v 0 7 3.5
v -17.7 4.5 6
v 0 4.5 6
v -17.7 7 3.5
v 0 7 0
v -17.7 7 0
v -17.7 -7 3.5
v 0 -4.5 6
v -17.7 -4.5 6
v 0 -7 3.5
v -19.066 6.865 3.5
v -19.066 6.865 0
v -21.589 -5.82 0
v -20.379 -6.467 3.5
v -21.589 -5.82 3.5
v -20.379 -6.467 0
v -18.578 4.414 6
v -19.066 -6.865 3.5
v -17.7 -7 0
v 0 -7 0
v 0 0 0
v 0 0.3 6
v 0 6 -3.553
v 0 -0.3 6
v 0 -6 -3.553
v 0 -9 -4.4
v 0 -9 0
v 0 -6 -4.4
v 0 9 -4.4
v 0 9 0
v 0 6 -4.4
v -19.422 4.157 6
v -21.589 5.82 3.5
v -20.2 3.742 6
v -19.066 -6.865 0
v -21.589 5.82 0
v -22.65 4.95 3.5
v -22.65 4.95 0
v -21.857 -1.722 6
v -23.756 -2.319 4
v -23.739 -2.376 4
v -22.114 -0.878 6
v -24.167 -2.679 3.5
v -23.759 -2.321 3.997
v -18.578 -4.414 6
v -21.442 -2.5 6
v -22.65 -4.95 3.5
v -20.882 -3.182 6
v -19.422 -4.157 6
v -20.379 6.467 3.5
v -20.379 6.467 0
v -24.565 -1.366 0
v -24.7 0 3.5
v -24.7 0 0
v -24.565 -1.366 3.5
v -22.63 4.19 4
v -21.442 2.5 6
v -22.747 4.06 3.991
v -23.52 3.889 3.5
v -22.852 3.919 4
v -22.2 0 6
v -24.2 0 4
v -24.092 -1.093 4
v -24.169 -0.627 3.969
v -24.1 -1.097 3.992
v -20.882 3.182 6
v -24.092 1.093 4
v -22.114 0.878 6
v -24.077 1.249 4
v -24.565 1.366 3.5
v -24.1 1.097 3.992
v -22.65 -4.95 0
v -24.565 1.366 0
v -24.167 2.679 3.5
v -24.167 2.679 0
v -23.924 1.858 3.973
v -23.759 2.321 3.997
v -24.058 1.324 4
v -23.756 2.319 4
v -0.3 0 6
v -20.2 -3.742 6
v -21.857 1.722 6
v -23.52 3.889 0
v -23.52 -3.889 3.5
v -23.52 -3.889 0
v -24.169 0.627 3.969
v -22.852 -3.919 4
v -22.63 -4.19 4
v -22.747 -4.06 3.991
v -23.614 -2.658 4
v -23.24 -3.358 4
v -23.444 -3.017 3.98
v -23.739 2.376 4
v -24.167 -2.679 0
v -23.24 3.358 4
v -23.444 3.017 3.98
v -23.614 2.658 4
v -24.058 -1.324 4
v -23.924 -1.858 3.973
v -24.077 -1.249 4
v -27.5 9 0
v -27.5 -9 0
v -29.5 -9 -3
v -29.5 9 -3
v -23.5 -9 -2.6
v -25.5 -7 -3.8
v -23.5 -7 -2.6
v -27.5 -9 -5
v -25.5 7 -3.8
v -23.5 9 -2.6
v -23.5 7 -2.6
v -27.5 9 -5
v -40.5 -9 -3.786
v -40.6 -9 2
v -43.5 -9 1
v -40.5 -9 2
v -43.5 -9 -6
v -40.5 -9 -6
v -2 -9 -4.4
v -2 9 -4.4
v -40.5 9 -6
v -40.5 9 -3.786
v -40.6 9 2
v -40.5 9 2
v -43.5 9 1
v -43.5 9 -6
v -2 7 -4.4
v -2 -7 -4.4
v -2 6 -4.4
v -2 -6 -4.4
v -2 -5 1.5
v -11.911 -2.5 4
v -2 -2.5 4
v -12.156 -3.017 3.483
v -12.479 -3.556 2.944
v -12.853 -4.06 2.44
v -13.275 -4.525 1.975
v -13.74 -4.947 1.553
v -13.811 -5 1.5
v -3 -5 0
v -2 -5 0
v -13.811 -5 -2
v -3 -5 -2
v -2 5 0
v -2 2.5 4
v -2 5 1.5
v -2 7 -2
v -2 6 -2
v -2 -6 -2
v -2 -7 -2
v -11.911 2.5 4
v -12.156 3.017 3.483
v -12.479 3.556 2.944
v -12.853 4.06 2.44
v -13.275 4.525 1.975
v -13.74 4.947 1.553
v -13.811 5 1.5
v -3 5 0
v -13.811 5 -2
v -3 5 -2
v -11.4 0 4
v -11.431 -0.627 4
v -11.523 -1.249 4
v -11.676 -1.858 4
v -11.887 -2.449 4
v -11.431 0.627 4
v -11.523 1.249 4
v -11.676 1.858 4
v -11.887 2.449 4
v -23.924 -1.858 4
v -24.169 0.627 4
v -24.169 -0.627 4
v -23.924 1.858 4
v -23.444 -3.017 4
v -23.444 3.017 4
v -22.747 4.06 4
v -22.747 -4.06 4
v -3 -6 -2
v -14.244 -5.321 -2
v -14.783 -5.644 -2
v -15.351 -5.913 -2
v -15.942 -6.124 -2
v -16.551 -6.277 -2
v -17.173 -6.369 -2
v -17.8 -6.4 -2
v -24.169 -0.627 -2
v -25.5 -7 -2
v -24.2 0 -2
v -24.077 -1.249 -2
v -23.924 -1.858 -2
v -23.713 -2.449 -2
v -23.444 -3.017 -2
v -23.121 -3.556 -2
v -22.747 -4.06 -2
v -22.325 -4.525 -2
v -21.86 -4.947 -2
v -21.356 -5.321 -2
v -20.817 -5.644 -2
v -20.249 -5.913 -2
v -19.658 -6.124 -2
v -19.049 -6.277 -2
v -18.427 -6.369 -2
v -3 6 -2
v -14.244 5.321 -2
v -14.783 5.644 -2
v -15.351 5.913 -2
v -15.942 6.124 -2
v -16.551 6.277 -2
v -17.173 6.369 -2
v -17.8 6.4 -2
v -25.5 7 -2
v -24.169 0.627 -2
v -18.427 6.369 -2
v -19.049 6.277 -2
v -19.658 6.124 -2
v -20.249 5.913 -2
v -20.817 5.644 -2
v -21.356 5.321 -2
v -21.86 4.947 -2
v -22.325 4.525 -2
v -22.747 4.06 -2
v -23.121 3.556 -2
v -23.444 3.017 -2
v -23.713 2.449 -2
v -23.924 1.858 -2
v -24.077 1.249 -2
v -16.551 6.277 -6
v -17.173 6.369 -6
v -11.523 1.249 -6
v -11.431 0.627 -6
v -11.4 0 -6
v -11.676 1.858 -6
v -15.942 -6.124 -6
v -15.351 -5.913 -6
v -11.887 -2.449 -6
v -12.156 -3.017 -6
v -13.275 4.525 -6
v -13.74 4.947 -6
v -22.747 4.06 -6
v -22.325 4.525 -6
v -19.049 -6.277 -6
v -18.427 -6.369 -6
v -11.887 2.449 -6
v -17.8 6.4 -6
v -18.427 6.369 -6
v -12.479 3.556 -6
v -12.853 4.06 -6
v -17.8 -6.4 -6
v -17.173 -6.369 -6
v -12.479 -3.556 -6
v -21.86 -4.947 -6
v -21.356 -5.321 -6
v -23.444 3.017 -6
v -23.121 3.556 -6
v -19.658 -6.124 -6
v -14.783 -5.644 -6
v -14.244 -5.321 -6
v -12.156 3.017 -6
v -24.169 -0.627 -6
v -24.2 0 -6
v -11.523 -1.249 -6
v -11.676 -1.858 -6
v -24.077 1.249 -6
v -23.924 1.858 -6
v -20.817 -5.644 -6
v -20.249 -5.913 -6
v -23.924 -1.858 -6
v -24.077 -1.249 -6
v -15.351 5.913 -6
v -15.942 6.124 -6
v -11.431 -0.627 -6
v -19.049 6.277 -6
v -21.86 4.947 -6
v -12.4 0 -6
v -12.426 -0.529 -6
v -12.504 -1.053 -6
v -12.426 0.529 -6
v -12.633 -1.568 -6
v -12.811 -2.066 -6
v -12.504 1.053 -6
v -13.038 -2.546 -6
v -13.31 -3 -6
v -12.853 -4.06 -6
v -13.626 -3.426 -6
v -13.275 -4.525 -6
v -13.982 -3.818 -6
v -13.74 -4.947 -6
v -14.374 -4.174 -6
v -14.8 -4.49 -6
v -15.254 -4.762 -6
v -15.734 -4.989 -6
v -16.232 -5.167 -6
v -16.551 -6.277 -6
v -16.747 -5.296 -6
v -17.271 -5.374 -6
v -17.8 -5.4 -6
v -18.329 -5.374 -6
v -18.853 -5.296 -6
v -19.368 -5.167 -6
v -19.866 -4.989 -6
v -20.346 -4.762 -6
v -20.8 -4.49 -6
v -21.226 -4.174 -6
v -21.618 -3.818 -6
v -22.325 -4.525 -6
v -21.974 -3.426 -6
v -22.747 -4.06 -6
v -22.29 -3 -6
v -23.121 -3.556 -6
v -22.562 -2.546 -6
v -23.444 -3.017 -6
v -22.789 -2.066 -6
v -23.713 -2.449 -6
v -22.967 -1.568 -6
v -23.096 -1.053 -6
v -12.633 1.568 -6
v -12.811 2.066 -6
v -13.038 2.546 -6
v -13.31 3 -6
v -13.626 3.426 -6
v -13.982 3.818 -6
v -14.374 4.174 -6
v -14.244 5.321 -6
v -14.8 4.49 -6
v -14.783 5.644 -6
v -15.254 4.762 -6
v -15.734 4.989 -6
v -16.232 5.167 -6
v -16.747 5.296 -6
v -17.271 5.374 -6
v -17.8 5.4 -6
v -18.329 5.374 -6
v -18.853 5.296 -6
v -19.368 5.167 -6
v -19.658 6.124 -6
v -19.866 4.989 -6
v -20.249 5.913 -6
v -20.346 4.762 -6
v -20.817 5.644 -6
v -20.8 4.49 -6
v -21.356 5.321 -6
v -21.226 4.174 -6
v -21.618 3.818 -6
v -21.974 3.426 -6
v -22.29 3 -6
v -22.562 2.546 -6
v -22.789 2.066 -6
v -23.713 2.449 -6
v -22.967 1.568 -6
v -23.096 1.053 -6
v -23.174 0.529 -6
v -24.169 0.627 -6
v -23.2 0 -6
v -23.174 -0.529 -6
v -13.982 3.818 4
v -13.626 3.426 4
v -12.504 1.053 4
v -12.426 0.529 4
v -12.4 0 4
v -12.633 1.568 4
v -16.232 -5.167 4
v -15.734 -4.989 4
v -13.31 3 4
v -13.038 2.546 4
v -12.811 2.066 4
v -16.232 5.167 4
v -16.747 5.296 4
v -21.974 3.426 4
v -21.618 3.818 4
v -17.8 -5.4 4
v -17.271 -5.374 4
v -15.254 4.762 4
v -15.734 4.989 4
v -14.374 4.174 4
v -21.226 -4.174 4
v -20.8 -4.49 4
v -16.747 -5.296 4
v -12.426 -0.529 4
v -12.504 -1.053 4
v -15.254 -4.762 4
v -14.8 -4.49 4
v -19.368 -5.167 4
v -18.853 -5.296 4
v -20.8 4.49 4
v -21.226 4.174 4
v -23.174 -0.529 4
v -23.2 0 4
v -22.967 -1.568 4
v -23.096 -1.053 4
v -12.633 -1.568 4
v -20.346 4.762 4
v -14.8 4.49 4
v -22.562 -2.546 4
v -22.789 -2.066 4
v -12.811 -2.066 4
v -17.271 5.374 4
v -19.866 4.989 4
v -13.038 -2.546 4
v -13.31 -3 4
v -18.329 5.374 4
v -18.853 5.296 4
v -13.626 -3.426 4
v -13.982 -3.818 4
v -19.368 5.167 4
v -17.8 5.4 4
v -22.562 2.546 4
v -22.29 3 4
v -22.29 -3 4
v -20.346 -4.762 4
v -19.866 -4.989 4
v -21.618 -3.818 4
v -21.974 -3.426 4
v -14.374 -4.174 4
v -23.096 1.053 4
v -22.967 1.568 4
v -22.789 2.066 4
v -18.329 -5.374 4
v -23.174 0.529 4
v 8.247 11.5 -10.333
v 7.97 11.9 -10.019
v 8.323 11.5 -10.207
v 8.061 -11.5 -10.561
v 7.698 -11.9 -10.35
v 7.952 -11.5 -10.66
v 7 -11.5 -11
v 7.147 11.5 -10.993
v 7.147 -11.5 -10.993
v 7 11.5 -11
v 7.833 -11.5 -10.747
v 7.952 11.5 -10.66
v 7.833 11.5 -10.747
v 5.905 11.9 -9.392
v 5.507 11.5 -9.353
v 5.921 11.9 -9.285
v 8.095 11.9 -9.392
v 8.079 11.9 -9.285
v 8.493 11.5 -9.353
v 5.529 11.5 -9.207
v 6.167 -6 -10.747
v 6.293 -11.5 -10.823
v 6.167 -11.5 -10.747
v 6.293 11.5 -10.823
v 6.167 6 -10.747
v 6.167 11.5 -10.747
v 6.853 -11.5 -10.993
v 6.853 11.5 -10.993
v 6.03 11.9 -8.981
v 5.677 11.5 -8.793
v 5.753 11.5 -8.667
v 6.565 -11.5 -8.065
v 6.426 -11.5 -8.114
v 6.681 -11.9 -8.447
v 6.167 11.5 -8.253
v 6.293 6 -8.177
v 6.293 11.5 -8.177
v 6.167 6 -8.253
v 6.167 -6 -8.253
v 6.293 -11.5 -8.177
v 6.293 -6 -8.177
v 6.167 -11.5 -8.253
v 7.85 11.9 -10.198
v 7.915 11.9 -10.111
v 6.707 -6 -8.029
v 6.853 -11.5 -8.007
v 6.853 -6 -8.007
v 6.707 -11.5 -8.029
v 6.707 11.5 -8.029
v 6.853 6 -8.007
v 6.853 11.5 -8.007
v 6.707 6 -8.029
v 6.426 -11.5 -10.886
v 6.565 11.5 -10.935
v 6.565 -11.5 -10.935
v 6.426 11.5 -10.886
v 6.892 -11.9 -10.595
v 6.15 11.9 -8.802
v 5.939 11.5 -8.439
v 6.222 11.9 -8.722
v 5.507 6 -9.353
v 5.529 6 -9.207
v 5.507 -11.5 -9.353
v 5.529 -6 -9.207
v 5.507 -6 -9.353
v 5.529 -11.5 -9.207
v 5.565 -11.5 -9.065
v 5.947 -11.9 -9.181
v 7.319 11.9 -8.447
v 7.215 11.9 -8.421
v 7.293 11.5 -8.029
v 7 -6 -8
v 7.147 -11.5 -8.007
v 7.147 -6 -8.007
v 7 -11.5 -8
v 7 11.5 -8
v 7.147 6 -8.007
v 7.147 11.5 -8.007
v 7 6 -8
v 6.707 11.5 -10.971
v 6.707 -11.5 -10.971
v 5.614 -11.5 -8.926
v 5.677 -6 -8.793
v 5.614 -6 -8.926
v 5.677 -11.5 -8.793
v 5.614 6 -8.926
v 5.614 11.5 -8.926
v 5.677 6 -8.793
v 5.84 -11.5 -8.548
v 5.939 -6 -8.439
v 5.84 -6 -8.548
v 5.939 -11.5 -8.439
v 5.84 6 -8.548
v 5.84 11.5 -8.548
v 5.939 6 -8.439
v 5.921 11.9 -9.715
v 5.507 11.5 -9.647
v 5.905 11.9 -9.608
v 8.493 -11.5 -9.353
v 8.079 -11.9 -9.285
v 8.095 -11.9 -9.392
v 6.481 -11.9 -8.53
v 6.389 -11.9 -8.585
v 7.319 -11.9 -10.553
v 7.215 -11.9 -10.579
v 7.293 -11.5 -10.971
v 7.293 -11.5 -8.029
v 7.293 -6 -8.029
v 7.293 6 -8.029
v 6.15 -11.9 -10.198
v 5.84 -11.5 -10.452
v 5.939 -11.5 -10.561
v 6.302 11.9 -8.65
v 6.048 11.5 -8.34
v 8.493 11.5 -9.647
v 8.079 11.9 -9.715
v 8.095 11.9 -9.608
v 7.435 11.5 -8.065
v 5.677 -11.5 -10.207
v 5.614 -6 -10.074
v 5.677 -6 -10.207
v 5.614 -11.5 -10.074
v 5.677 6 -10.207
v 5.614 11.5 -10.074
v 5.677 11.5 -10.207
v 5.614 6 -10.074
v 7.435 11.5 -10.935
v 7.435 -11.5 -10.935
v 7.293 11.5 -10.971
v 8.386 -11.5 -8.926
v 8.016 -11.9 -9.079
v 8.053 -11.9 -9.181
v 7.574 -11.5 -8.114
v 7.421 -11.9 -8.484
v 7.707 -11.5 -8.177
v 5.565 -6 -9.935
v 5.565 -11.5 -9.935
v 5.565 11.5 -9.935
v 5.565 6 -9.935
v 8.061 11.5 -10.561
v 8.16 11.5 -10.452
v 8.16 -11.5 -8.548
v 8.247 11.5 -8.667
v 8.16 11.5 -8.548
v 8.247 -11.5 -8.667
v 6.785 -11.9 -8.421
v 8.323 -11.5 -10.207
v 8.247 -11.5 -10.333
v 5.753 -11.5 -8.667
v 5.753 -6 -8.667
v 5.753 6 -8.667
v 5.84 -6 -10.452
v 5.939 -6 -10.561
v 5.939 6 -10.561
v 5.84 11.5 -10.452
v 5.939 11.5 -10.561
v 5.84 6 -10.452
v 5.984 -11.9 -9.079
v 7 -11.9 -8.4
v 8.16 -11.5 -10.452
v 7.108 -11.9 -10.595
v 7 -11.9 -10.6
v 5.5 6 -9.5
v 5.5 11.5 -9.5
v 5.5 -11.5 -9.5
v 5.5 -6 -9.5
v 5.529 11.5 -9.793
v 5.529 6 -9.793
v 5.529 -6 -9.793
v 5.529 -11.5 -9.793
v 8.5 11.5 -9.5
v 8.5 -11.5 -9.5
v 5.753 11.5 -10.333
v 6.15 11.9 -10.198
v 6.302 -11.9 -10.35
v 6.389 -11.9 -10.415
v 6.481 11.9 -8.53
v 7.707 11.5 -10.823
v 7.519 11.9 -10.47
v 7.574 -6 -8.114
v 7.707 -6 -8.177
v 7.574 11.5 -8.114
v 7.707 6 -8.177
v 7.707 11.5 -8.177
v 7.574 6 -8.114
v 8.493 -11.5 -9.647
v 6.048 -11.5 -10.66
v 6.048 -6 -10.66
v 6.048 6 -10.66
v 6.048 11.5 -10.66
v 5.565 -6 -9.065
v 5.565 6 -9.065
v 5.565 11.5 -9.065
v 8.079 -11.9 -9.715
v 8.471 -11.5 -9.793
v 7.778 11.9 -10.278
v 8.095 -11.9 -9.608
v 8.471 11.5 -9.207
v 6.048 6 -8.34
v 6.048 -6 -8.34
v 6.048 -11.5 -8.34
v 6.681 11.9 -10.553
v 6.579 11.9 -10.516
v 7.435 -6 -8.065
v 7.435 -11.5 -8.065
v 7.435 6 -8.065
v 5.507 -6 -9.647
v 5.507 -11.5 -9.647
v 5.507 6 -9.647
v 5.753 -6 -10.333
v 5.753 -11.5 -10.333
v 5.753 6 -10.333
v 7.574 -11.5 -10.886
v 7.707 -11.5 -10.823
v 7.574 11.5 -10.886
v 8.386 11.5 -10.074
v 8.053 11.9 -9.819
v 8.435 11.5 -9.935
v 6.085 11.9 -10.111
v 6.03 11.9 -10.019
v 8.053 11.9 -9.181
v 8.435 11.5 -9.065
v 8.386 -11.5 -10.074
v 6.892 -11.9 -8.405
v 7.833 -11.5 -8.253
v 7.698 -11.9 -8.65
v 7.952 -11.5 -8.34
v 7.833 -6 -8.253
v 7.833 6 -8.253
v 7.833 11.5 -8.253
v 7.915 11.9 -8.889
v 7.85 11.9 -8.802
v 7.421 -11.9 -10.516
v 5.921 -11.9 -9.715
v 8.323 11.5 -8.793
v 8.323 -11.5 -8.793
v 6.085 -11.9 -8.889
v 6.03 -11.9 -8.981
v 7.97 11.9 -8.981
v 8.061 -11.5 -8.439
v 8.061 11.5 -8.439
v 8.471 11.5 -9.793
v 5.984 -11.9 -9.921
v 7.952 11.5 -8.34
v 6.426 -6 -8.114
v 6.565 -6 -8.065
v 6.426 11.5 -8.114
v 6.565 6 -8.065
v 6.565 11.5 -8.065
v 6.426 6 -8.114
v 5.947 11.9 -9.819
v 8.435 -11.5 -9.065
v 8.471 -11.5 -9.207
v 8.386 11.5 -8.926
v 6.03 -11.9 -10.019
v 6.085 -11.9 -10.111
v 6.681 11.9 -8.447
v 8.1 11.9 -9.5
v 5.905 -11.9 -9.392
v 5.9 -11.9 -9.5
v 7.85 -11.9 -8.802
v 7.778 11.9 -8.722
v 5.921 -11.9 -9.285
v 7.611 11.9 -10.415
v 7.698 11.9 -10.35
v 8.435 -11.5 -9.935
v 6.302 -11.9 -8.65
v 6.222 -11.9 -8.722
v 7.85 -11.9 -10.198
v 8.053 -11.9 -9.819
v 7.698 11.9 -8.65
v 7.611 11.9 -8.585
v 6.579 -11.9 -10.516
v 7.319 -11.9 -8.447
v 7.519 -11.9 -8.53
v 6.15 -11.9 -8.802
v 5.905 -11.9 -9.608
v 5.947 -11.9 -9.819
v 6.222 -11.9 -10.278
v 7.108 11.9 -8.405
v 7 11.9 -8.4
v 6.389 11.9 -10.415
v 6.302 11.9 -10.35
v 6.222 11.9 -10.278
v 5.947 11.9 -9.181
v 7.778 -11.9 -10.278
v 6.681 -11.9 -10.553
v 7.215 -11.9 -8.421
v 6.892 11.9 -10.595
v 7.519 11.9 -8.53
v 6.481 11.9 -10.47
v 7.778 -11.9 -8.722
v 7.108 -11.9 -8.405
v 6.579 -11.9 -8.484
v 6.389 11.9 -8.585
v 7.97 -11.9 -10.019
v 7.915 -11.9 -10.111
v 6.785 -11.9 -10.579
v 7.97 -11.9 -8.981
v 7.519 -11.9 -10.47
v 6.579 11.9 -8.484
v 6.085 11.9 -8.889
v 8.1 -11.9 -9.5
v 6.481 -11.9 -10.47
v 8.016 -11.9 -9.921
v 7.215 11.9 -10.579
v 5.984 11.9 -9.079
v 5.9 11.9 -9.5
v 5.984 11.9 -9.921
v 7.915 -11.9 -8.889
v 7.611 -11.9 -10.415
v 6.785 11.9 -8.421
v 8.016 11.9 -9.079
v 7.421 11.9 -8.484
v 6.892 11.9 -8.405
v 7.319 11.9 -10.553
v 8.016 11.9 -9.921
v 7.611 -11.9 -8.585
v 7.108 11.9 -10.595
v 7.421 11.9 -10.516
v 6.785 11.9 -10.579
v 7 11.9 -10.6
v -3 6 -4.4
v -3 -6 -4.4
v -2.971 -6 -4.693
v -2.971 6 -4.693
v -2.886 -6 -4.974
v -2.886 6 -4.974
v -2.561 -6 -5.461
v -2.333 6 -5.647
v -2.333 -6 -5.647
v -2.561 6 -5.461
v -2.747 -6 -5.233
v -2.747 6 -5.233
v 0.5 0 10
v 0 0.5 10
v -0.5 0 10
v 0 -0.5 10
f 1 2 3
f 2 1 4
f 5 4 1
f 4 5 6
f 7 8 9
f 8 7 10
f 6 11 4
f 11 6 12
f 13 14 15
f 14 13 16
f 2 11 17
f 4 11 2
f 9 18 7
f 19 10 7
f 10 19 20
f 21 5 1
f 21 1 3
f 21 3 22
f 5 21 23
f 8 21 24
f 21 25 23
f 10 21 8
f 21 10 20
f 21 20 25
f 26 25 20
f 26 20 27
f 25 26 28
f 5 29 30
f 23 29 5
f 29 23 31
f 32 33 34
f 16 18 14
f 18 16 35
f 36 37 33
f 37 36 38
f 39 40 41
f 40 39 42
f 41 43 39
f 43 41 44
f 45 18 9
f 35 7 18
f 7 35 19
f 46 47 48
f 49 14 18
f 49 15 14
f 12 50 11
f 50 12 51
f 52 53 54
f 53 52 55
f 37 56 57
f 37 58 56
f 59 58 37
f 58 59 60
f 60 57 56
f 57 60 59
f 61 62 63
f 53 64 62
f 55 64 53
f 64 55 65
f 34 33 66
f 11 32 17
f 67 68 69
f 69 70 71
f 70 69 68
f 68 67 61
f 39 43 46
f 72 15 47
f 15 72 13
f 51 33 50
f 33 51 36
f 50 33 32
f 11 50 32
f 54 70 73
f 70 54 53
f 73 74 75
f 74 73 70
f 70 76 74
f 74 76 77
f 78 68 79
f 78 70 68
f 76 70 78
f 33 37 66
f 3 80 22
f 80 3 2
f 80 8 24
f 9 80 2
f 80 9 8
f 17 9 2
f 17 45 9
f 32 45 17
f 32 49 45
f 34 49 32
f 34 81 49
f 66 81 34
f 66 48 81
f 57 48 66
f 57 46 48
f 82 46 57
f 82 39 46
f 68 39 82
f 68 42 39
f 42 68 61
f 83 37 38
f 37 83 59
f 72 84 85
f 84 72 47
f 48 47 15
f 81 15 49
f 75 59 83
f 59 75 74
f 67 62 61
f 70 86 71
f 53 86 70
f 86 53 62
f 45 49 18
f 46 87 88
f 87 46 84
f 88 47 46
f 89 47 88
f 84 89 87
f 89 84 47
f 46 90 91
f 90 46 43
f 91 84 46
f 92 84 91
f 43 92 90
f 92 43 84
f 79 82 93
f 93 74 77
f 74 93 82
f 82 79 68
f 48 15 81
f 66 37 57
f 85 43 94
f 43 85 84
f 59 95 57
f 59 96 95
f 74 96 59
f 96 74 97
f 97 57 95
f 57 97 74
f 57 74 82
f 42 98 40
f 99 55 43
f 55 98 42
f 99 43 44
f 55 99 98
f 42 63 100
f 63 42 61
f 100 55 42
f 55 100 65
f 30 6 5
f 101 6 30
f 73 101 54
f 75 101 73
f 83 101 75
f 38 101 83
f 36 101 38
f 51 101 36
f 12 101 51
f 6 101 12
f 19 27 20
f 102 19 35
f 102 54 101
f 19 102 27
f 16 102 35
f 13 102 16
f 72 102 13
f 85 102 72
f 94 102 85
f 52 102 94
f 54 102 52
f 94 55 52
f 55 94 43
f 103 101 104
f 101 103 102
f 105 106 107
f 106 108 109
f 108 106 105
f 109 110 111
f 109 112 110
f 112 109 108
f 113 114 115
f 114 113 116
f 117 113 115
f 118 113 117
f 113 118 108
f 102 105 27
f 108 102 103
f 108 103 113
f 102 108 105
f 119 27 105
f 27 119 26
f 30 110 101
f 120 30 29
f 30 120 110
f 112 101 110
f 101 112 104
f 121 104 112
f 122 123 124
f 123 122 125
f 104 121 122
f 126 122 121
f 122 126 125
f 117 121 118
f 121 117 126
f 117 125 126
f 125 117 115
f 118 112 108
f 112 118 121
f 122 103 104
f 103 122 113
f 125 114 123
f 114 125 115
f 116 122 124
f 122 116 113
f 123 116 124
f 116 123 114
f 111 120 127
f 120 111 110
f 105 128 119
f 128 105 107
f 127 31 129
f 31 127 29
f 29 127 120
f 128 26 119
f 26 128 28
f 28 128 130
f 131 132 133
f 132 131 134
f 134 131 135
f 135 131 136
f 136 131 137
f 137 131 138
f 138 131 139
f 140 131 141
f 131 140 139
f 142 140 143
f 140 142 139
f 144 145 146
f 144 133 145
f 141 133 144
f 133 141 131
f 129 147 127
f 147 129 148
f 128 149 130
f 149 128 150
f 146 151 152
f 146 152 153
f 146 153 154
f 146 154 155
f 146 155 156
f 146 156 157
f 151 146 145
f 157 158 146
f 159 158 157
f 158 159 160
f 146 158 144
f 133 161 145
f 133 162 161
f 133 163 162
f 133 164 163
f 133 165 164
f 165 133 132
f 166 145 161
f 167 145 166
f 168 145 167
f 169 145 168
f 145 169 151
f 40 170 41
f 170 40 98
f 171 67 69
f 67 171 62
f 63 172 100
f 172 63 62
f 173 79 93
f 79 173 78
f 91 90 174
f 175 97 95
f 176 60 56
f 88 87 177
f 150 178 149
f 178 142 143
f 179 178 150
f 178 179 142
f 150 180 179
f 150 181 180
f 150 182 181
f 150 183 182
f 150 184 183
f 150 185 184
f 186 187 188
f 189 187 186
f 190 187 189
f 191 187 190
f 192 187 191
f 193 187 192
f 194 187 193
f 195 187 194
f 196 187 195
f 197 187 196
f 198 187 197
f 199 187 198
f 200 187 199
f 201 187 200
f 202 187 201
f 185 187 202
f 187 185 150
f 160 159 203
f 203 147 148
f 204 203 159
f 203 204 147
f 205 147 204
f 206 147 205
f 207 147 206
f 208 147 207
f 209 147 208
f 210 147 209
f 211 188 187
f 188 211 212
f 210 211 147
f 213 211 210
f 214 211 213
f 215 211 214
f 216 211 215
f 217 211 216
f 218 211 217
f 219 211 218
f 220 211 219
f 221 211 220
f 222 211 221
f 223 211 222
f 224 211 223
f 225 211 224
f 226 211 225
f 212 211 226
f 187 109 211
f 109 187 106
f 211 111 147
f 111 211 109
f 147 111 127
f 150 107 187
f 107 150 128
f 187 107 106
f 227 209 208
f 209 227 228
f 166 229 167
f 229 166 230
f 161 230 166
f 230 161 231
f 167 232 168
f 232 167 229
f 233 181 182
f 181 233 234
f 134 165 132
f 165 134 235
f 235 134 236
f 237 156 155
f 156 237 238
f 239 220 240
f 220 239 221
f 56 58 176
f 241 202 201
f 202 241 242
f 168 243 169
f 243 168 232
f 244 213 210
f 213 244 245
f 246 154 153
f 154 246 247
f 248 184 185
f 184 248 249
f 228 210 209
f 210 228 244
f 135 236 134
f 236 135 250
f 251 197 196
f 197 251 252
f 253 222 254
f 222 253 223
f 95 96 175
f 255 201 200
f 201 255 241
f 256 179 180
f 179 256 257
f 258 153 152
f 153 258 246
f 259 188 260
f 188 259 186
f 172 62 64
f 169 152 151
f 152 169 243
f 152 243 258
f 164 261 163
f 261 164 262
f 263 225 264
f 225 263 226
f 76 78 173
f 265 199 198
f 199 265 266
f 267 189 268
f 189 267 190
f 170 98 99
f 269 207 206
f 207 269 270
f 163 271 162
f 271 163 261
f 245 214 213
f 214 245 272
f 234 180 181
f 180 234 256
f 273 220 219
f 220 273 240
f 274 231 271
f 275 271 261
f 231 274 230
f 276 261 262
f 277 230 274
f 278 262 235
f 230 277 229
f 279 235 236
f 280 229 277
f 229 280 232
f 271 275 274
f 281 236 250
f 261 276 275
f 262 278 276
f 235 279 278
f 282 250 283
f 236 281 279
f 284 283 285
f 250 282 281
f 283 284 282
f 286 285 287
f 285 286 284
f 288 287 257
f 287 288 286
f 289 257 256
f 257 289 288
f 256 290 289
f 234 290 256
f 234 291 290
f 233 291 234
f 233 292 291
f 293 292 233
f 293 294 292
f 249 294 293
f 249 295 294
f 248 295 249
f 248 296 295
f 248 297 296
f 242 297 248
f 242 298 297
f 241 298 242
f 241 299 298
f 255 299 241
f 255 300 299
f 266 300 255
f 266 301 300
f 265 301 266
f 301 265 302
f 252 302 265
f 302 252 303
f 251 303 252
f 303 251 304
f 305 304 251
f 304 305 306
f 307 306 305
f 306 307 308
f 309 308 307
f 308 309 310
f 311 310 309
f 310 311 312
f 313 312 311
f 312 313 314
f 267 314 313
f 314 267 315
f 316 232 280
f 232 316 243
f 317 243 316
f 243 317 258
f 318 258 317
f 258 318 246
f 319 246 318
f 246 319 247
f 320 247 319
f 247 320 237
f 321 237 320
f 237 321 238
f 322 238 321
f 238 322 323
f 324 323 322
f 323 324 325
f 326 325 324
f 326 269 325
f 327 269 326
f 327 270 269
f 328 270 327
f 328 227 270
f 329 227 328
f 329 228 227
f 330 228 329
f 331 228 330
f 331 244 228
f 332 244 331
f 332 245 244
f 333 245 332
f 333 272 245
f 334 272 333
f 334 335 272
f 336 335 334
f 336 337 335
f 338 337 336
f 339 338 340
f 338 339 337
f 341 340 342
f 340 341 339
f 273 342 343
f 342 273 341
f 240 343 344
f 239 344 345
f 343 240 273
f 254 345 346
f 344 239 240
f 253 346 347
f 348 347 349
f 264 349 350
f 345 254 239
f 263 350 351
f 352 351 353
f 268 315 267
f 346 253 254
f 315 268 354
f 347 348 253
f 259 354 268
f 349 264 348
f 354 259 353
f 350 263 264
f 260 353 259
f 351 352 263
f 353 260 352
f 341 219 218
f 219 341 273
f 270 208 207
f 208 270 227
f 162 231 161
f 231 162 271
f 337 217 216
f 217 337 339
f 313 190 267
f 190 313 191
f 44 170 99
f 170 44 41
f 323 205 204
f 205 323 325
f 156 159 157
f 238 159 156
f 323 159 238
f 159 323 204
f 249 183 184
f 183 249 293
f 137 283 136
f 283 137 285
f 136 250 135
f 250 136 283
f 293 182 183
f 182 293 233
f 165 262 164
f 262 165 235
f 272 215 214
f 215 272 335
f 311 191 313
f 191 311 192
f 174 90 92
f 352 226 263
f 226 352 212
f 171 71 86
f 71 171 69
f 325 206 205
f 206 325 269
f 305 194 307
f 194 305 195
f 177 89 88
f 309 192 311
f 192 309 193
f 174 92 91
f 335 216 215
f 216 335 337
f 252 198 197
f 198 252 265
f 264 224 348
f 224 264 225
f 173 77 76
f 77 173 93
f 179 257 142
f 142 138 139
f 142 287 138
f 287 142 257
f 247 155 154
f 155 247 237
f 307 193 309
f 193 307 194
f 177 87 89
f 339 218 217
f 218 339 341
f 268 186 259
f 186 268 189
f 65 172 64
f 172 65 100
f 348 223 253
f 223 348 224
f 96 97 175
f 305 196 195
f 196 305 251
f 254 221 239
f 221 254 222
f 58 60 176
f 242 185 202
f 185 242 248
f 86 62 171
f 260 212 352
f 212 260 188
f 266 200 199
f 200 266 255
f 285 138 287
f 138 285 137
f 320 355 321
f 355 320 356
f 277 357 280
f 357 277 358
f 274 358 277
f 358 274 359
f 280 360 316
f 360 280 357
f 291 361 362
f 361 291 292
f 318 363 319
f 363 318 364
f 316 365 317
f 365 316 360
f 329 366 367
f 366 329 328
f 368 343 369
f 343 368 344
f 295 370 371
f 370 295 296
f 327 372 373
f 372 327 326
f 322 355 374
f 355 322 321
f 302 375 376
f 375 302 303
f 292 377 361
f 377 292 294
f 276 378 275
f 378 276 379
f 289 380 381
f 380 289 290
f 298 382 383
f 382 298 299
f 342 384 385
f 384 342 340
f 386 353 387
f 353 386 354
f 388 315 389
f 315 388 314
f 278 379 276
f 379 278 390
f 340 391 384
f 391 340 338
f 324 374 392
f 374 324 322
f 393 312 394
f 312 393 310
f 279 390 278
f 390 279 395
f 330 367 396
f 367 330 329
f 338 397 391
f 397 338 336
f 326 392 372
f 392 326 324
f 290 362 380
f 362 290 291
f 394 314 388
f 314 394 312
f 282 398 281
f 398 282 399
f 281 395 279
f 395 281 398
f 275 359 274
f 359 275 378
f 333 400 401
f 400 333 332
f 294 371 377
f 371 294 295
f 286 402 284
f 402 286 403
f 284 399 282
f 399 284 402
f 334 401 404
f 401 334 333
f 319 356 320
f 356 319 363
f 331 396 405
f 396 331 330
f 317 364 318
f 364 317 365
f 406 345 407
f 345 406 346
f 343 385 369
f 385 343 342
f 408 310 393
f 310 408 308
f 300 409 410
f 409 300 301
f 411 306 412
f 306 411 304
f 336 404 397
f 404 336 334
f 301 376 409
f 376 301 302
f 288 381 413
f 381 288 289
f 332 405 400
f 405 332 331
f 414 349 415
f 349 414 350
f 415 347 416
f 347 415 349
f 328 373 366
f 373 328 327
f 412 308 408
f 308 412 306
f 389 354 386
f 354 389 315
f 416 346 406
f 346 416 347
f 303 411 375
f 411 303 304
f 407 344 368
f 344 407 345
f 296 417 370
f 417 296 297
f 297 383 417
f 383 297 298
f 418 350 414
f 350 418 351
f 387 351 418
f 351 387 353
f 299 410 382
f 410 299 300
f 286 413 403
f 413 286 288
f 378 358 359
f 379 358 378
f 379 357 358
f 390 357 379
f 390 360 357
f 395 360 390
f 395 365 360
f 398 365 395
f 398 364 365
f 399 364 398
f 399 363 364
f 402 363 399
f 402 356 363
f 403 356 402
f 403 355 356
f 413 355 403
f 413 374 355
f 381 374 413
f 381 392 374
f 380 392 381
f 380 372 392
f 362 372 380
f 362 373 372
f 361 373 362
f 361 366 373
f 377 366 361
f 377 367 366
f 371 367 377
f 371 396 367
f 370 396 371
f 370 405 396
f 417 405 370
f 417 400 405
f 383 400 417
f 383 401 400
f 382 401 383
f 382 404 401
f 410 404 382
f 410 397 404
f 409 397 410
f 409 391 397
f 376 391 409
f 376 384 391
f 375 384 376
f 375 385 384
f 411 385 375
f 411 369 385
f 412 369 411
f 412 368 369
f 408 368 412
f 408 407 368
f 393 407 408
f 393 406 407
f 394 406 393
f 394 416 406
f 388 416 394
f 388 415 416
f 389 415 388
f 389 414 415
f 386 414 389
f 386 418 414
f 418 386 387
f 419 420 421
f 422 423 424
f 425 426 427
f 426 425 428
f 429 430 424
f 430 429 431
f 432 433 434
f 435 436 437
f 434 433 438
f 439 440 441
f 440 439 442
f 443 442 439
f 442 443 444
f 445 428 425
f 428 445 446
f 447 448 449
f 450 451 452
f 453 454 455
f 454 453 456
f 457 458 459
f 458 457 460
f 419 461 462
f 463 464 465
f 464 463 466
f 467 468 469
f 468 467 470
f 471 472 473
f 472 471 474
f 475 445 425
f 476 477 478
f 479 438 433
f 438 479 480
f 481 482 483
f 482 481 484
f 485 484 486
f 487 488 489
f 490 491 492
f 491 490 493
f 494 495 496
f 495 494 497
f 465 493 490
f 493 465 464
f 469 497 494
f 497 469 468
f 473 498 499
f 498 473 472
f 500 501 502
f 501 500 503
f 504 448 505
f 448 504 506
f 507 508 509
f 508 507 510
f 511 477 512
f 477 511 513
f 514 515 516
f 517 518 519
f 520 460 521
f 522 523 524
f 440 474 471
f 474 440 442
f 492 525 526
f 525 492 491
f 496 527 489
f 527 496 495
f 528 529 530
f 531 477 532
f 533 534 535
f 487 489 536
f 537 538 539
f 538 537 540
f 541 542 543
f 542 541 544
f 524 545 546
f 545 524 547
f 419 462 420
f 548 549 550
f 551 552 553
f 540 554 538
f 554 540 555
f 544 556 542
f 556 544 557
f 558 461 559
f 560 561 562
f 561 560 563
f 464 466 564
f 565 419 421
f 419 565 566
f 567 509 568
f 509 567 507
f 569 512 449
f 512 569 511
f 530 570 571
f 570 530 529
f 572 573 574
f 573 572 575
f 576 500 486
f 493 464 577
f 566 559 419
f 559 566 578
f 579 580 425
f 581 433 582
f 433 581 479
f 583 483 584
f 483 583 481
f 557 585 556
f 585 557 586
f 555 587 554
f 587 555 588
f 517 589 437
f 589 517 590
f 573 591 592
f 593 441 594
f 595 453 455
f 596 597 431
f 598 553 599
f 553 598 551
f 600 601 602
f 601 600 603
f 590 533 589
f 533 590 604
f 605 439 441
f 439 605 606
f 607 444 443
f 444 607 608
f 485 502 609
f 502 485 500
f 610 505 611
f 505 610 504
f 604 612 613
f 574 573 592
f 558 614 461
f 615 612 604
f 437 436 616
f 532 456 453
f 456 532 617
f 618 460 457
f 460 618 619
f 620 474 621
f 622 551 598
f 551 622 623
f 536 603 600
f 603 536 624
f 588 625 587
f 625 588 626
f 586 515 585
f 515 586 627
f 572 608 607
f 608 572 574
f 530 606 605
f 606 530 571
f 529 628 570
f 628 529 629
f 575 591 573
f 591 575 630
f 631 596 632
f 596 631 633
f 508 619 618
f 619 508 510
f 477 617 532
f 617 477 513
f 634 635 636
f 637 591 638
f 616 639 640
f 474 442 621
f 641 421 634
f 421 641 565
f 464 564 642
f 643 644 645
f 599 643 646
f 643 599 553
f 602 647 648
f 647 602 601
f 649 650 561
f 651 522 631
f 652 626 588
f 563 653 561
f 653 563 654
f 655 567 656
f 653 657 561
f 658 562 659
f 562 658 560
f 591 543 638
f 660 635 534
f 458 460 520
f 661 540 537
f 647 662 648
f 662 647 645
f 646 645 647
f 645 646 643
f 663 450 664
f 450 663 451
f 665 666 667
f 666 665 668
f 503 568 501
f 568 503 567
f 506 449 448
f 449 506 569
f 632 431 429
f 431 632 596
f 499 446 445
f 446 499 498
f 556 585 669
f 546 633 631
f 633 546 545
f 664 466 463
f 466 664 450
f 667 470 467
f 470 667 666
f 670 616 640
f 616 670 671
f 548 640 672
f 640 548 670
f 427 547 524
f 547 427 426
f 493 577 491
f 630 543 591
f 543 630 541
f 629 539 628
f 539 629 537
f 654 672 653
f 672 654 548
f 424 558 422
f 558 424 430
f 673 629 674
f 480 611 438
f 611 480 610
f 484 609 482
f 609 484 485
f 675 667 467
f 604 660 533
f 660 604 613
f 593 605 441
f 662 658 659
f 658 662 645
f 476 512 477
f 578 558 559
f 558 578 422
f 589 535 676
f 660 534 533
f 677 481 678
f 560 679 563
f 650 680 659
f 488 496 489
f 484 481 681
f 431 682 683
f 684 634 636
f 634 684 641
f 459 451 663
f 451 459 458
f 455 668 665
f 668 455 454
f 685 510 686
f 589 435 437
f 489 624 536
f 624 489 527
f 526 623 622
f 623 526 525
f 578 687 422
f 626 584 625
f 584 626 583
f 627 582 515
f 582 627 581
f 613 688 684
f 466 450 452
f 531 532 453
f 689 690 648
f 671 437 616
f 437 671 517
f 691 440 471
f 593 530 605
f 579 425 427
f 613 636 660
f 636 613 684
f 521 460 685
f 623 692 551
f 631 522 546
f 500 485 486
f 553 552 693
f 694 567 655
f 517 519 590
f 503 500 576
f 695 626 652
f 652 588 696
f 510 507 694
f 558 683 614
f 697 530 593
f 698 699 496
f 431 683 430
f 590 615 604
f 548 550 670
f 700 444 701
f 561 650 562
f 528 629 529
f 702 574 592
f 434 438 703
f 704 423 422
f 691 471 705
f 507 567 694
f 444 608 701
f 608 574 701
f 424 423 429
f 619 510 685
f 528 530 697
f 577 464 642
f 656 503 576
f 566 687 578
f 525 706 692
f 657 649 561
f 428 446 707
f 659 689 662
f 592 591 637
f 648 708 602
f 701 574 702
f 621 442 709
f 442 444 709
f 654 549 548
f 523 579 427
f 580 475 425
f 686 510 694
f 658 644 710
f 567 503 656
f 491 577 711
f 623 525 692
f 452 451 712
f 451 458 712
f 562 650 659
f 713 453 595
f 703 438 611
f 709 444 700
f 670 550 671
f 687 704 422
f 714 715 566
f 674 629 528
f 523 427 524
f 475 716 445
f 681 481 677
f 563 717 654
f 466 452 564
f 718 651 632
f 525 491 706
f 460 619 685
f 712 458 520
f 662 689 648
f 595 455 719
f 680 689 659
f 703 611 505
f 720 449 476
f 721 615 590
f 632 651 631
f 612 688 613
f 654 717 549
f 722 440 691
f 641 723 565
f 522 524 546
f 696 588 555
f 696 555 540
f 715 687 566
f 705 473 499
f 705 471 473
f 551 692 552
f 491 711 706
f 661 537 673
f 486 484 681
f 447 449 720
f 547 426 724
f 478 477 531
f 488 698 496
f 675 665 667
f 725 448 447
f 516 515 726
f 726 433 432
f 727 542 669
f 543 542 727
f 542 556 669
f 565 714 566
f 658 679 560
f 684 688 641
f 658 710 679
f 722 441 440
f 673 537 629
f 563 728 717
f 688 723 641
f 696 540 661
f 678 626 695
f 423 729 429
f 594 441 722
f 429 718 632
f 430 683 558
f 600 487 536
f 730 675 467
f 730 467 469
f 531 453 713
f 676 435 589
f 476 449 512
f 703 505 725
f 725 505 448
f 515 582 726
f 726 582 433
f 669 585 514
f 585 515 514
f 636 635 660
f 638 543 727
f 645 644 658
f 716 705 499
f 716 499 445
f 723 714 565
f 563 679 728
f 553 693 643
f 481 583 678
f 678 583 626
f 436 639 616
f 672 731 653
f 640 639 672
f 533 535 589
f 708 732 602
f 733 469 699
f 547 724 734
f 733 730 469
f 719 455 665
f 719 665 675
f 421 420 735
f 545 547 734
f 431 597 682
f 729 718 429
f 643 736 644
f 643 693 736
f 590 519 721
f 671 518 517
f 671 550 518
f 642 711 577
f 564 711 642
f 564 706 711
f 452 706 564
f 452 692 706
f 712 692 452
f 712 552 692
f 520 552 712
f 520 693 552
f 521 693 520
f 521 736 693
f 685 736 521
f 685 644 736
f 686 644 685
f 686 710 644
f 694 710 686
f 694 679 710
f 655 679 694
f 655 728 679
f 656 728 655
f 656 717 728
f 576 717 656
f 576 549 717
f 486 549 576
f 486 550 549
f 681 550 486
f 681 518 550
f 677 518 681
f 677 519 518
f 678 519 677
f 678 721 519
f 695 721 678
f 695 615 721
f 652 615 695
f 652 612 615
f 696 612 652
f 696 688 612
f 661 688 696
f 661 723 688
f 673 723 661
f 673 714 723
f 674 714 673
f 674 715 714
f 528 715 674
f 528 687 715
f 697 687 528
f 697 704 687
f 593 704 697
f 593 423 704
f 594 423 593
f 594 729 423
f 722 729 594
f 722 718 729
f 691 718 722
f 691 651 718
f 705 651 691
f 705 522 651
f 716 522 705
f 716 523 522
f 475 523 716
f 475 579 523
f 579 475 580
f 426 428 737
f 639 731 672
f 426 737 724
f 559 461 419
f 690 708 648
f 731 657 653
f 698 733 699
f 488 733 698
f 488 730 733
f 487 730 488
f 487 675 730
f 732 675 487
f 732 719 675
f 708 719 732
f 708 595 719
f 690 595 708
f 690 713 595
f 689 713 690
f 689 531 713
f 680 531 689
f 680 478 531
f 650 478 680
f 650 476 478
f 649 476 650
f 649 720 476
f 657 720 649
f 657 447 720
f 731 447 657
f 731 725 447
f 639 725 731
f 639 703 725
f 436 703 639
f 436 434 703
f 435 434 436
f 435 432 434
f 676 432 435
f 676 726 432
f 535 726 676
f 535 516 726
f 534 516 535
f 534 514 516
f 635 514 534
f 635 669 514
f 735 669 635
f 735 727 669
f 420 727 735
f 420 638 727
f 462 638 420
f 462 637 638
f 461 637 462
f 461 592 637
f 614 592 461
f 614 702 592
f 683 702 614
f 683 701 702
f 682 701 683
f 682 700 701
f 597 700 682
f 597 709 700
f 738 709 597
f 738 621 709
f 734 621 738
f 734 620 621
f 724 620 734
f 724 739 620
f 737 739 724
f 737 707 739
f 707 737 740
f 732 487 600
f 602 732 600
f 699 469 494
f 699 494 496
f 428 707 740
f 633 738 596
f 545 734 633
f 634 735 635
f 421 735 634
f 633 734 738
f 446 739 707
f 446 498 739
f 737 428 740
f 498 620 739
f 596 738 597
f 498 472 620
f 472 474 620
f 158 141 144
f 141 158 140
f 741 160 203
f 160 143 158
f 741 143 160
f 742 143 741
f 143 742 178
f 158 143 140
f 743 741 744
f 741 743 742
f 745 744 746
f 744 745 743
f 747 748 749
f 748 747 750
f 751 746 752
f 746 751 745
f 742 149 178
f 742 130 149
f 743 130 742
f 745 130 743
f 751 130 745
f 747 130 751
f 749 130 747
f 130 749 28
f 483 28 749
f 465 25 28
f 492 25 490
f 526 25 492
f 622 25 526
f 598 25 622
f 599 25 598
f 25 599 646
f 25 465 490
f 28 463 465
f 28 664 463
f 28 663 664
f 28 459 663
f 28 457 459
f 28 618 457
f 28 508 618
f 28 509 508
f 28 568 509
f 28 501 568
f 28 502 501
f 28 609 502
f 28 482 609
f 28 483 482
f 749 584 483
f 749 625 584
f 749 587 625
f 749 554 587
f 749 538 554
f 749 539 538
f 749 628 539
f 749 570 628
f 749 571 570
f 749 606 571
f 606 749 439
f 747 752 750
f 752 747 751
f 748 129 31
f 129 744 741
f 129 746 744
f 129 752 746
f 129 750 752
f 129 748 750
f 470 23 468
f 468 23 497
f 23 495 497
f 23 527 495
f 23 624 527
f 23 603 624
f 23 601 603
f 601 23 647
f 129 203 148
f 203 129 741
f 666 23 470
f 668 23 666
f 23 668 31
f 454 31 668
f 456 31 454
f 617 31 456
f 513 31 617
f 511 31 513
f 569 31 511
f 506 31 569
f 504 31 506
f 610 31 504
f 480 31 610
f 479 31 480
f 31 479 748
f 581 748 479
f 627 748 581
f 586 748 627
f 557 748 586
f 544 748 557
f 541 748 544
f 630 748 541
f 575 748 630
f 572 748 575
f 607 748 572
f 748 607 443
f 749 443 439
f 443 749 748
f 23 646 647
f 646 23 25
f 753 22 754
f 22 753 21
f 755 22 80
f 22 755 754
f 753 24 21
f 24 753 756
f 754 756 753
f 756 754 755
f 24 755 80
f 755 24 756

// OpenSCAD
/**
 * Martin Egli
 * 2024-04-14
 */

module origin(col = "Red", h1 = 10, loc_res = 4) {
    color(col)
    cylinder(d1 = 0, d2 = 1, h = h1, $fn = loc_res);
}
module button1(show_origin = 1, col = "Green", loc_res = 32) {
    if(show_origin) {
        origin();
    }
    color(col) {
        difference() {
            union() {
                difference() {
                    union() {
                        // button
                        hull() {
                            translate([-1, -14/2, 0])
                            cube([1, 14, 3.5]);
                            translate([-1, -(14-5)/2, 0])
                            cube([1, (14-5), 6]);
                            translate([-(24.7-7), 0, 0])
                            cylinder(d = (14-5), h = 6, $fn = loc_res);
                            translate([-(24.7-7), 0, 0])
                            cylinder(d = 14, h = 3.5, $fn = loc_res);
                        }
                        // main part
                        hull() {
                            translate([-27.5, -18/2, -2.6])
                            cube([4, 18, 2.6]);
                            translate([-29.5, -18/2, -5])
                            cube([2, 18, 2]);
                        }
                        hull() {
                            translate([-29.5, -18/2, -5])
                            cube([2, 18, 2]);
                            translate([-43.5, -18/2, -6])
                            cube([3, 18, 2]);
                        }
                        // latch
                        hull() {
                            translate([-(43.5-2.9), -18/2, -6])
                            cube([0.1, 18, 8]);
                            translate([-43.5, -18/2, -6])
                            cube([3, 18, 7]);
                        }
                        hull() {
                            translate([-(27.5-4), -18/2, -2.6])
                            cube([4, 18, 2.6]);
                            translate([-2, -18/2, -4.4])
                            cube([2, 18, 4.4]);
                        }
                    }

                    // cut out to make part hollow
                    // button
                    translate([0, 0, -2])
                    hull() {
                        translate([-(2+1), -(14-4)/2, -0.5])
                        cube([1, (14-4), 3.5+0.5]);
                        translate([-(2+1), -(14-5-4)/2, -0.5])
                        cube([1, (14-5-4), 6+0.5]);
                        translate([-(24.7-7), 0, -0.5])
                        cylinder(d = (14-5-4), h = 6+0.5, $fn = loc_res);
                        translate([-(24.7-7), 0, -0.5])
                        cylinder(d = 14-4, h = 3.5+0.5, $fn = loc_res);
                    }
                    // main body
                    translate([-(27.5-2), -(18-4)/2, -6])
                    cube([(27.5-4), (18-4), 4]);
                }
                // spring holder, measured d = 12.4 -> 0.8 mm wall thickness, not enough -> 1 mm
                translate([-(24-12.4/2),0,-6])
                cylinder(d = (10.8+2), h = 10, $fn = loc_res*2);
            }
            // spring holder bore: 10.8 mm
            translate([-(24-12.4/2),0,-(6+1)])
            cylinder(d = 10.8, h = 10+1, $fn = loc_res*2);
        }
        // pivot at the back
        translate([7, -23.8/2, -(11-3/2)])
        rotate([-90, 0, 0])
        // with temper
        hull() {
            translate([0, 0, +0.4])
            cylinder(d = 3, h = 23.0, $fn = loc_res*2);
            translate([0, 0, +0.0])
            cylinder(d = 2.2, h = 23.8, $fn = loc_res*2);
        }
        // connect to pivot
        hull() {
            translate([-3, -12/2, -3])
            cube([3, 12, 3]);
            translate([-3/2, -12/2, -4.4])
            rotate([-90, 0, 0])
            cylinder(d = 3, h = 12, $fn = loc_res);
        }
        hull() {
            translate([-3/2, -12/2, -4.4])
            rotate([-90, 0, 0])
            cylinder(d = 3, h = 12, $fn = loc_res);
            translate([7, -12/2, -(11-3/2)])
            rotate([-90, 0, 0])
            cylinder(d = 3, h = 12, $fn = loc_res);
        }
    }
}

button1();
//button1(0, "LightBlue", 64); // print 1x
